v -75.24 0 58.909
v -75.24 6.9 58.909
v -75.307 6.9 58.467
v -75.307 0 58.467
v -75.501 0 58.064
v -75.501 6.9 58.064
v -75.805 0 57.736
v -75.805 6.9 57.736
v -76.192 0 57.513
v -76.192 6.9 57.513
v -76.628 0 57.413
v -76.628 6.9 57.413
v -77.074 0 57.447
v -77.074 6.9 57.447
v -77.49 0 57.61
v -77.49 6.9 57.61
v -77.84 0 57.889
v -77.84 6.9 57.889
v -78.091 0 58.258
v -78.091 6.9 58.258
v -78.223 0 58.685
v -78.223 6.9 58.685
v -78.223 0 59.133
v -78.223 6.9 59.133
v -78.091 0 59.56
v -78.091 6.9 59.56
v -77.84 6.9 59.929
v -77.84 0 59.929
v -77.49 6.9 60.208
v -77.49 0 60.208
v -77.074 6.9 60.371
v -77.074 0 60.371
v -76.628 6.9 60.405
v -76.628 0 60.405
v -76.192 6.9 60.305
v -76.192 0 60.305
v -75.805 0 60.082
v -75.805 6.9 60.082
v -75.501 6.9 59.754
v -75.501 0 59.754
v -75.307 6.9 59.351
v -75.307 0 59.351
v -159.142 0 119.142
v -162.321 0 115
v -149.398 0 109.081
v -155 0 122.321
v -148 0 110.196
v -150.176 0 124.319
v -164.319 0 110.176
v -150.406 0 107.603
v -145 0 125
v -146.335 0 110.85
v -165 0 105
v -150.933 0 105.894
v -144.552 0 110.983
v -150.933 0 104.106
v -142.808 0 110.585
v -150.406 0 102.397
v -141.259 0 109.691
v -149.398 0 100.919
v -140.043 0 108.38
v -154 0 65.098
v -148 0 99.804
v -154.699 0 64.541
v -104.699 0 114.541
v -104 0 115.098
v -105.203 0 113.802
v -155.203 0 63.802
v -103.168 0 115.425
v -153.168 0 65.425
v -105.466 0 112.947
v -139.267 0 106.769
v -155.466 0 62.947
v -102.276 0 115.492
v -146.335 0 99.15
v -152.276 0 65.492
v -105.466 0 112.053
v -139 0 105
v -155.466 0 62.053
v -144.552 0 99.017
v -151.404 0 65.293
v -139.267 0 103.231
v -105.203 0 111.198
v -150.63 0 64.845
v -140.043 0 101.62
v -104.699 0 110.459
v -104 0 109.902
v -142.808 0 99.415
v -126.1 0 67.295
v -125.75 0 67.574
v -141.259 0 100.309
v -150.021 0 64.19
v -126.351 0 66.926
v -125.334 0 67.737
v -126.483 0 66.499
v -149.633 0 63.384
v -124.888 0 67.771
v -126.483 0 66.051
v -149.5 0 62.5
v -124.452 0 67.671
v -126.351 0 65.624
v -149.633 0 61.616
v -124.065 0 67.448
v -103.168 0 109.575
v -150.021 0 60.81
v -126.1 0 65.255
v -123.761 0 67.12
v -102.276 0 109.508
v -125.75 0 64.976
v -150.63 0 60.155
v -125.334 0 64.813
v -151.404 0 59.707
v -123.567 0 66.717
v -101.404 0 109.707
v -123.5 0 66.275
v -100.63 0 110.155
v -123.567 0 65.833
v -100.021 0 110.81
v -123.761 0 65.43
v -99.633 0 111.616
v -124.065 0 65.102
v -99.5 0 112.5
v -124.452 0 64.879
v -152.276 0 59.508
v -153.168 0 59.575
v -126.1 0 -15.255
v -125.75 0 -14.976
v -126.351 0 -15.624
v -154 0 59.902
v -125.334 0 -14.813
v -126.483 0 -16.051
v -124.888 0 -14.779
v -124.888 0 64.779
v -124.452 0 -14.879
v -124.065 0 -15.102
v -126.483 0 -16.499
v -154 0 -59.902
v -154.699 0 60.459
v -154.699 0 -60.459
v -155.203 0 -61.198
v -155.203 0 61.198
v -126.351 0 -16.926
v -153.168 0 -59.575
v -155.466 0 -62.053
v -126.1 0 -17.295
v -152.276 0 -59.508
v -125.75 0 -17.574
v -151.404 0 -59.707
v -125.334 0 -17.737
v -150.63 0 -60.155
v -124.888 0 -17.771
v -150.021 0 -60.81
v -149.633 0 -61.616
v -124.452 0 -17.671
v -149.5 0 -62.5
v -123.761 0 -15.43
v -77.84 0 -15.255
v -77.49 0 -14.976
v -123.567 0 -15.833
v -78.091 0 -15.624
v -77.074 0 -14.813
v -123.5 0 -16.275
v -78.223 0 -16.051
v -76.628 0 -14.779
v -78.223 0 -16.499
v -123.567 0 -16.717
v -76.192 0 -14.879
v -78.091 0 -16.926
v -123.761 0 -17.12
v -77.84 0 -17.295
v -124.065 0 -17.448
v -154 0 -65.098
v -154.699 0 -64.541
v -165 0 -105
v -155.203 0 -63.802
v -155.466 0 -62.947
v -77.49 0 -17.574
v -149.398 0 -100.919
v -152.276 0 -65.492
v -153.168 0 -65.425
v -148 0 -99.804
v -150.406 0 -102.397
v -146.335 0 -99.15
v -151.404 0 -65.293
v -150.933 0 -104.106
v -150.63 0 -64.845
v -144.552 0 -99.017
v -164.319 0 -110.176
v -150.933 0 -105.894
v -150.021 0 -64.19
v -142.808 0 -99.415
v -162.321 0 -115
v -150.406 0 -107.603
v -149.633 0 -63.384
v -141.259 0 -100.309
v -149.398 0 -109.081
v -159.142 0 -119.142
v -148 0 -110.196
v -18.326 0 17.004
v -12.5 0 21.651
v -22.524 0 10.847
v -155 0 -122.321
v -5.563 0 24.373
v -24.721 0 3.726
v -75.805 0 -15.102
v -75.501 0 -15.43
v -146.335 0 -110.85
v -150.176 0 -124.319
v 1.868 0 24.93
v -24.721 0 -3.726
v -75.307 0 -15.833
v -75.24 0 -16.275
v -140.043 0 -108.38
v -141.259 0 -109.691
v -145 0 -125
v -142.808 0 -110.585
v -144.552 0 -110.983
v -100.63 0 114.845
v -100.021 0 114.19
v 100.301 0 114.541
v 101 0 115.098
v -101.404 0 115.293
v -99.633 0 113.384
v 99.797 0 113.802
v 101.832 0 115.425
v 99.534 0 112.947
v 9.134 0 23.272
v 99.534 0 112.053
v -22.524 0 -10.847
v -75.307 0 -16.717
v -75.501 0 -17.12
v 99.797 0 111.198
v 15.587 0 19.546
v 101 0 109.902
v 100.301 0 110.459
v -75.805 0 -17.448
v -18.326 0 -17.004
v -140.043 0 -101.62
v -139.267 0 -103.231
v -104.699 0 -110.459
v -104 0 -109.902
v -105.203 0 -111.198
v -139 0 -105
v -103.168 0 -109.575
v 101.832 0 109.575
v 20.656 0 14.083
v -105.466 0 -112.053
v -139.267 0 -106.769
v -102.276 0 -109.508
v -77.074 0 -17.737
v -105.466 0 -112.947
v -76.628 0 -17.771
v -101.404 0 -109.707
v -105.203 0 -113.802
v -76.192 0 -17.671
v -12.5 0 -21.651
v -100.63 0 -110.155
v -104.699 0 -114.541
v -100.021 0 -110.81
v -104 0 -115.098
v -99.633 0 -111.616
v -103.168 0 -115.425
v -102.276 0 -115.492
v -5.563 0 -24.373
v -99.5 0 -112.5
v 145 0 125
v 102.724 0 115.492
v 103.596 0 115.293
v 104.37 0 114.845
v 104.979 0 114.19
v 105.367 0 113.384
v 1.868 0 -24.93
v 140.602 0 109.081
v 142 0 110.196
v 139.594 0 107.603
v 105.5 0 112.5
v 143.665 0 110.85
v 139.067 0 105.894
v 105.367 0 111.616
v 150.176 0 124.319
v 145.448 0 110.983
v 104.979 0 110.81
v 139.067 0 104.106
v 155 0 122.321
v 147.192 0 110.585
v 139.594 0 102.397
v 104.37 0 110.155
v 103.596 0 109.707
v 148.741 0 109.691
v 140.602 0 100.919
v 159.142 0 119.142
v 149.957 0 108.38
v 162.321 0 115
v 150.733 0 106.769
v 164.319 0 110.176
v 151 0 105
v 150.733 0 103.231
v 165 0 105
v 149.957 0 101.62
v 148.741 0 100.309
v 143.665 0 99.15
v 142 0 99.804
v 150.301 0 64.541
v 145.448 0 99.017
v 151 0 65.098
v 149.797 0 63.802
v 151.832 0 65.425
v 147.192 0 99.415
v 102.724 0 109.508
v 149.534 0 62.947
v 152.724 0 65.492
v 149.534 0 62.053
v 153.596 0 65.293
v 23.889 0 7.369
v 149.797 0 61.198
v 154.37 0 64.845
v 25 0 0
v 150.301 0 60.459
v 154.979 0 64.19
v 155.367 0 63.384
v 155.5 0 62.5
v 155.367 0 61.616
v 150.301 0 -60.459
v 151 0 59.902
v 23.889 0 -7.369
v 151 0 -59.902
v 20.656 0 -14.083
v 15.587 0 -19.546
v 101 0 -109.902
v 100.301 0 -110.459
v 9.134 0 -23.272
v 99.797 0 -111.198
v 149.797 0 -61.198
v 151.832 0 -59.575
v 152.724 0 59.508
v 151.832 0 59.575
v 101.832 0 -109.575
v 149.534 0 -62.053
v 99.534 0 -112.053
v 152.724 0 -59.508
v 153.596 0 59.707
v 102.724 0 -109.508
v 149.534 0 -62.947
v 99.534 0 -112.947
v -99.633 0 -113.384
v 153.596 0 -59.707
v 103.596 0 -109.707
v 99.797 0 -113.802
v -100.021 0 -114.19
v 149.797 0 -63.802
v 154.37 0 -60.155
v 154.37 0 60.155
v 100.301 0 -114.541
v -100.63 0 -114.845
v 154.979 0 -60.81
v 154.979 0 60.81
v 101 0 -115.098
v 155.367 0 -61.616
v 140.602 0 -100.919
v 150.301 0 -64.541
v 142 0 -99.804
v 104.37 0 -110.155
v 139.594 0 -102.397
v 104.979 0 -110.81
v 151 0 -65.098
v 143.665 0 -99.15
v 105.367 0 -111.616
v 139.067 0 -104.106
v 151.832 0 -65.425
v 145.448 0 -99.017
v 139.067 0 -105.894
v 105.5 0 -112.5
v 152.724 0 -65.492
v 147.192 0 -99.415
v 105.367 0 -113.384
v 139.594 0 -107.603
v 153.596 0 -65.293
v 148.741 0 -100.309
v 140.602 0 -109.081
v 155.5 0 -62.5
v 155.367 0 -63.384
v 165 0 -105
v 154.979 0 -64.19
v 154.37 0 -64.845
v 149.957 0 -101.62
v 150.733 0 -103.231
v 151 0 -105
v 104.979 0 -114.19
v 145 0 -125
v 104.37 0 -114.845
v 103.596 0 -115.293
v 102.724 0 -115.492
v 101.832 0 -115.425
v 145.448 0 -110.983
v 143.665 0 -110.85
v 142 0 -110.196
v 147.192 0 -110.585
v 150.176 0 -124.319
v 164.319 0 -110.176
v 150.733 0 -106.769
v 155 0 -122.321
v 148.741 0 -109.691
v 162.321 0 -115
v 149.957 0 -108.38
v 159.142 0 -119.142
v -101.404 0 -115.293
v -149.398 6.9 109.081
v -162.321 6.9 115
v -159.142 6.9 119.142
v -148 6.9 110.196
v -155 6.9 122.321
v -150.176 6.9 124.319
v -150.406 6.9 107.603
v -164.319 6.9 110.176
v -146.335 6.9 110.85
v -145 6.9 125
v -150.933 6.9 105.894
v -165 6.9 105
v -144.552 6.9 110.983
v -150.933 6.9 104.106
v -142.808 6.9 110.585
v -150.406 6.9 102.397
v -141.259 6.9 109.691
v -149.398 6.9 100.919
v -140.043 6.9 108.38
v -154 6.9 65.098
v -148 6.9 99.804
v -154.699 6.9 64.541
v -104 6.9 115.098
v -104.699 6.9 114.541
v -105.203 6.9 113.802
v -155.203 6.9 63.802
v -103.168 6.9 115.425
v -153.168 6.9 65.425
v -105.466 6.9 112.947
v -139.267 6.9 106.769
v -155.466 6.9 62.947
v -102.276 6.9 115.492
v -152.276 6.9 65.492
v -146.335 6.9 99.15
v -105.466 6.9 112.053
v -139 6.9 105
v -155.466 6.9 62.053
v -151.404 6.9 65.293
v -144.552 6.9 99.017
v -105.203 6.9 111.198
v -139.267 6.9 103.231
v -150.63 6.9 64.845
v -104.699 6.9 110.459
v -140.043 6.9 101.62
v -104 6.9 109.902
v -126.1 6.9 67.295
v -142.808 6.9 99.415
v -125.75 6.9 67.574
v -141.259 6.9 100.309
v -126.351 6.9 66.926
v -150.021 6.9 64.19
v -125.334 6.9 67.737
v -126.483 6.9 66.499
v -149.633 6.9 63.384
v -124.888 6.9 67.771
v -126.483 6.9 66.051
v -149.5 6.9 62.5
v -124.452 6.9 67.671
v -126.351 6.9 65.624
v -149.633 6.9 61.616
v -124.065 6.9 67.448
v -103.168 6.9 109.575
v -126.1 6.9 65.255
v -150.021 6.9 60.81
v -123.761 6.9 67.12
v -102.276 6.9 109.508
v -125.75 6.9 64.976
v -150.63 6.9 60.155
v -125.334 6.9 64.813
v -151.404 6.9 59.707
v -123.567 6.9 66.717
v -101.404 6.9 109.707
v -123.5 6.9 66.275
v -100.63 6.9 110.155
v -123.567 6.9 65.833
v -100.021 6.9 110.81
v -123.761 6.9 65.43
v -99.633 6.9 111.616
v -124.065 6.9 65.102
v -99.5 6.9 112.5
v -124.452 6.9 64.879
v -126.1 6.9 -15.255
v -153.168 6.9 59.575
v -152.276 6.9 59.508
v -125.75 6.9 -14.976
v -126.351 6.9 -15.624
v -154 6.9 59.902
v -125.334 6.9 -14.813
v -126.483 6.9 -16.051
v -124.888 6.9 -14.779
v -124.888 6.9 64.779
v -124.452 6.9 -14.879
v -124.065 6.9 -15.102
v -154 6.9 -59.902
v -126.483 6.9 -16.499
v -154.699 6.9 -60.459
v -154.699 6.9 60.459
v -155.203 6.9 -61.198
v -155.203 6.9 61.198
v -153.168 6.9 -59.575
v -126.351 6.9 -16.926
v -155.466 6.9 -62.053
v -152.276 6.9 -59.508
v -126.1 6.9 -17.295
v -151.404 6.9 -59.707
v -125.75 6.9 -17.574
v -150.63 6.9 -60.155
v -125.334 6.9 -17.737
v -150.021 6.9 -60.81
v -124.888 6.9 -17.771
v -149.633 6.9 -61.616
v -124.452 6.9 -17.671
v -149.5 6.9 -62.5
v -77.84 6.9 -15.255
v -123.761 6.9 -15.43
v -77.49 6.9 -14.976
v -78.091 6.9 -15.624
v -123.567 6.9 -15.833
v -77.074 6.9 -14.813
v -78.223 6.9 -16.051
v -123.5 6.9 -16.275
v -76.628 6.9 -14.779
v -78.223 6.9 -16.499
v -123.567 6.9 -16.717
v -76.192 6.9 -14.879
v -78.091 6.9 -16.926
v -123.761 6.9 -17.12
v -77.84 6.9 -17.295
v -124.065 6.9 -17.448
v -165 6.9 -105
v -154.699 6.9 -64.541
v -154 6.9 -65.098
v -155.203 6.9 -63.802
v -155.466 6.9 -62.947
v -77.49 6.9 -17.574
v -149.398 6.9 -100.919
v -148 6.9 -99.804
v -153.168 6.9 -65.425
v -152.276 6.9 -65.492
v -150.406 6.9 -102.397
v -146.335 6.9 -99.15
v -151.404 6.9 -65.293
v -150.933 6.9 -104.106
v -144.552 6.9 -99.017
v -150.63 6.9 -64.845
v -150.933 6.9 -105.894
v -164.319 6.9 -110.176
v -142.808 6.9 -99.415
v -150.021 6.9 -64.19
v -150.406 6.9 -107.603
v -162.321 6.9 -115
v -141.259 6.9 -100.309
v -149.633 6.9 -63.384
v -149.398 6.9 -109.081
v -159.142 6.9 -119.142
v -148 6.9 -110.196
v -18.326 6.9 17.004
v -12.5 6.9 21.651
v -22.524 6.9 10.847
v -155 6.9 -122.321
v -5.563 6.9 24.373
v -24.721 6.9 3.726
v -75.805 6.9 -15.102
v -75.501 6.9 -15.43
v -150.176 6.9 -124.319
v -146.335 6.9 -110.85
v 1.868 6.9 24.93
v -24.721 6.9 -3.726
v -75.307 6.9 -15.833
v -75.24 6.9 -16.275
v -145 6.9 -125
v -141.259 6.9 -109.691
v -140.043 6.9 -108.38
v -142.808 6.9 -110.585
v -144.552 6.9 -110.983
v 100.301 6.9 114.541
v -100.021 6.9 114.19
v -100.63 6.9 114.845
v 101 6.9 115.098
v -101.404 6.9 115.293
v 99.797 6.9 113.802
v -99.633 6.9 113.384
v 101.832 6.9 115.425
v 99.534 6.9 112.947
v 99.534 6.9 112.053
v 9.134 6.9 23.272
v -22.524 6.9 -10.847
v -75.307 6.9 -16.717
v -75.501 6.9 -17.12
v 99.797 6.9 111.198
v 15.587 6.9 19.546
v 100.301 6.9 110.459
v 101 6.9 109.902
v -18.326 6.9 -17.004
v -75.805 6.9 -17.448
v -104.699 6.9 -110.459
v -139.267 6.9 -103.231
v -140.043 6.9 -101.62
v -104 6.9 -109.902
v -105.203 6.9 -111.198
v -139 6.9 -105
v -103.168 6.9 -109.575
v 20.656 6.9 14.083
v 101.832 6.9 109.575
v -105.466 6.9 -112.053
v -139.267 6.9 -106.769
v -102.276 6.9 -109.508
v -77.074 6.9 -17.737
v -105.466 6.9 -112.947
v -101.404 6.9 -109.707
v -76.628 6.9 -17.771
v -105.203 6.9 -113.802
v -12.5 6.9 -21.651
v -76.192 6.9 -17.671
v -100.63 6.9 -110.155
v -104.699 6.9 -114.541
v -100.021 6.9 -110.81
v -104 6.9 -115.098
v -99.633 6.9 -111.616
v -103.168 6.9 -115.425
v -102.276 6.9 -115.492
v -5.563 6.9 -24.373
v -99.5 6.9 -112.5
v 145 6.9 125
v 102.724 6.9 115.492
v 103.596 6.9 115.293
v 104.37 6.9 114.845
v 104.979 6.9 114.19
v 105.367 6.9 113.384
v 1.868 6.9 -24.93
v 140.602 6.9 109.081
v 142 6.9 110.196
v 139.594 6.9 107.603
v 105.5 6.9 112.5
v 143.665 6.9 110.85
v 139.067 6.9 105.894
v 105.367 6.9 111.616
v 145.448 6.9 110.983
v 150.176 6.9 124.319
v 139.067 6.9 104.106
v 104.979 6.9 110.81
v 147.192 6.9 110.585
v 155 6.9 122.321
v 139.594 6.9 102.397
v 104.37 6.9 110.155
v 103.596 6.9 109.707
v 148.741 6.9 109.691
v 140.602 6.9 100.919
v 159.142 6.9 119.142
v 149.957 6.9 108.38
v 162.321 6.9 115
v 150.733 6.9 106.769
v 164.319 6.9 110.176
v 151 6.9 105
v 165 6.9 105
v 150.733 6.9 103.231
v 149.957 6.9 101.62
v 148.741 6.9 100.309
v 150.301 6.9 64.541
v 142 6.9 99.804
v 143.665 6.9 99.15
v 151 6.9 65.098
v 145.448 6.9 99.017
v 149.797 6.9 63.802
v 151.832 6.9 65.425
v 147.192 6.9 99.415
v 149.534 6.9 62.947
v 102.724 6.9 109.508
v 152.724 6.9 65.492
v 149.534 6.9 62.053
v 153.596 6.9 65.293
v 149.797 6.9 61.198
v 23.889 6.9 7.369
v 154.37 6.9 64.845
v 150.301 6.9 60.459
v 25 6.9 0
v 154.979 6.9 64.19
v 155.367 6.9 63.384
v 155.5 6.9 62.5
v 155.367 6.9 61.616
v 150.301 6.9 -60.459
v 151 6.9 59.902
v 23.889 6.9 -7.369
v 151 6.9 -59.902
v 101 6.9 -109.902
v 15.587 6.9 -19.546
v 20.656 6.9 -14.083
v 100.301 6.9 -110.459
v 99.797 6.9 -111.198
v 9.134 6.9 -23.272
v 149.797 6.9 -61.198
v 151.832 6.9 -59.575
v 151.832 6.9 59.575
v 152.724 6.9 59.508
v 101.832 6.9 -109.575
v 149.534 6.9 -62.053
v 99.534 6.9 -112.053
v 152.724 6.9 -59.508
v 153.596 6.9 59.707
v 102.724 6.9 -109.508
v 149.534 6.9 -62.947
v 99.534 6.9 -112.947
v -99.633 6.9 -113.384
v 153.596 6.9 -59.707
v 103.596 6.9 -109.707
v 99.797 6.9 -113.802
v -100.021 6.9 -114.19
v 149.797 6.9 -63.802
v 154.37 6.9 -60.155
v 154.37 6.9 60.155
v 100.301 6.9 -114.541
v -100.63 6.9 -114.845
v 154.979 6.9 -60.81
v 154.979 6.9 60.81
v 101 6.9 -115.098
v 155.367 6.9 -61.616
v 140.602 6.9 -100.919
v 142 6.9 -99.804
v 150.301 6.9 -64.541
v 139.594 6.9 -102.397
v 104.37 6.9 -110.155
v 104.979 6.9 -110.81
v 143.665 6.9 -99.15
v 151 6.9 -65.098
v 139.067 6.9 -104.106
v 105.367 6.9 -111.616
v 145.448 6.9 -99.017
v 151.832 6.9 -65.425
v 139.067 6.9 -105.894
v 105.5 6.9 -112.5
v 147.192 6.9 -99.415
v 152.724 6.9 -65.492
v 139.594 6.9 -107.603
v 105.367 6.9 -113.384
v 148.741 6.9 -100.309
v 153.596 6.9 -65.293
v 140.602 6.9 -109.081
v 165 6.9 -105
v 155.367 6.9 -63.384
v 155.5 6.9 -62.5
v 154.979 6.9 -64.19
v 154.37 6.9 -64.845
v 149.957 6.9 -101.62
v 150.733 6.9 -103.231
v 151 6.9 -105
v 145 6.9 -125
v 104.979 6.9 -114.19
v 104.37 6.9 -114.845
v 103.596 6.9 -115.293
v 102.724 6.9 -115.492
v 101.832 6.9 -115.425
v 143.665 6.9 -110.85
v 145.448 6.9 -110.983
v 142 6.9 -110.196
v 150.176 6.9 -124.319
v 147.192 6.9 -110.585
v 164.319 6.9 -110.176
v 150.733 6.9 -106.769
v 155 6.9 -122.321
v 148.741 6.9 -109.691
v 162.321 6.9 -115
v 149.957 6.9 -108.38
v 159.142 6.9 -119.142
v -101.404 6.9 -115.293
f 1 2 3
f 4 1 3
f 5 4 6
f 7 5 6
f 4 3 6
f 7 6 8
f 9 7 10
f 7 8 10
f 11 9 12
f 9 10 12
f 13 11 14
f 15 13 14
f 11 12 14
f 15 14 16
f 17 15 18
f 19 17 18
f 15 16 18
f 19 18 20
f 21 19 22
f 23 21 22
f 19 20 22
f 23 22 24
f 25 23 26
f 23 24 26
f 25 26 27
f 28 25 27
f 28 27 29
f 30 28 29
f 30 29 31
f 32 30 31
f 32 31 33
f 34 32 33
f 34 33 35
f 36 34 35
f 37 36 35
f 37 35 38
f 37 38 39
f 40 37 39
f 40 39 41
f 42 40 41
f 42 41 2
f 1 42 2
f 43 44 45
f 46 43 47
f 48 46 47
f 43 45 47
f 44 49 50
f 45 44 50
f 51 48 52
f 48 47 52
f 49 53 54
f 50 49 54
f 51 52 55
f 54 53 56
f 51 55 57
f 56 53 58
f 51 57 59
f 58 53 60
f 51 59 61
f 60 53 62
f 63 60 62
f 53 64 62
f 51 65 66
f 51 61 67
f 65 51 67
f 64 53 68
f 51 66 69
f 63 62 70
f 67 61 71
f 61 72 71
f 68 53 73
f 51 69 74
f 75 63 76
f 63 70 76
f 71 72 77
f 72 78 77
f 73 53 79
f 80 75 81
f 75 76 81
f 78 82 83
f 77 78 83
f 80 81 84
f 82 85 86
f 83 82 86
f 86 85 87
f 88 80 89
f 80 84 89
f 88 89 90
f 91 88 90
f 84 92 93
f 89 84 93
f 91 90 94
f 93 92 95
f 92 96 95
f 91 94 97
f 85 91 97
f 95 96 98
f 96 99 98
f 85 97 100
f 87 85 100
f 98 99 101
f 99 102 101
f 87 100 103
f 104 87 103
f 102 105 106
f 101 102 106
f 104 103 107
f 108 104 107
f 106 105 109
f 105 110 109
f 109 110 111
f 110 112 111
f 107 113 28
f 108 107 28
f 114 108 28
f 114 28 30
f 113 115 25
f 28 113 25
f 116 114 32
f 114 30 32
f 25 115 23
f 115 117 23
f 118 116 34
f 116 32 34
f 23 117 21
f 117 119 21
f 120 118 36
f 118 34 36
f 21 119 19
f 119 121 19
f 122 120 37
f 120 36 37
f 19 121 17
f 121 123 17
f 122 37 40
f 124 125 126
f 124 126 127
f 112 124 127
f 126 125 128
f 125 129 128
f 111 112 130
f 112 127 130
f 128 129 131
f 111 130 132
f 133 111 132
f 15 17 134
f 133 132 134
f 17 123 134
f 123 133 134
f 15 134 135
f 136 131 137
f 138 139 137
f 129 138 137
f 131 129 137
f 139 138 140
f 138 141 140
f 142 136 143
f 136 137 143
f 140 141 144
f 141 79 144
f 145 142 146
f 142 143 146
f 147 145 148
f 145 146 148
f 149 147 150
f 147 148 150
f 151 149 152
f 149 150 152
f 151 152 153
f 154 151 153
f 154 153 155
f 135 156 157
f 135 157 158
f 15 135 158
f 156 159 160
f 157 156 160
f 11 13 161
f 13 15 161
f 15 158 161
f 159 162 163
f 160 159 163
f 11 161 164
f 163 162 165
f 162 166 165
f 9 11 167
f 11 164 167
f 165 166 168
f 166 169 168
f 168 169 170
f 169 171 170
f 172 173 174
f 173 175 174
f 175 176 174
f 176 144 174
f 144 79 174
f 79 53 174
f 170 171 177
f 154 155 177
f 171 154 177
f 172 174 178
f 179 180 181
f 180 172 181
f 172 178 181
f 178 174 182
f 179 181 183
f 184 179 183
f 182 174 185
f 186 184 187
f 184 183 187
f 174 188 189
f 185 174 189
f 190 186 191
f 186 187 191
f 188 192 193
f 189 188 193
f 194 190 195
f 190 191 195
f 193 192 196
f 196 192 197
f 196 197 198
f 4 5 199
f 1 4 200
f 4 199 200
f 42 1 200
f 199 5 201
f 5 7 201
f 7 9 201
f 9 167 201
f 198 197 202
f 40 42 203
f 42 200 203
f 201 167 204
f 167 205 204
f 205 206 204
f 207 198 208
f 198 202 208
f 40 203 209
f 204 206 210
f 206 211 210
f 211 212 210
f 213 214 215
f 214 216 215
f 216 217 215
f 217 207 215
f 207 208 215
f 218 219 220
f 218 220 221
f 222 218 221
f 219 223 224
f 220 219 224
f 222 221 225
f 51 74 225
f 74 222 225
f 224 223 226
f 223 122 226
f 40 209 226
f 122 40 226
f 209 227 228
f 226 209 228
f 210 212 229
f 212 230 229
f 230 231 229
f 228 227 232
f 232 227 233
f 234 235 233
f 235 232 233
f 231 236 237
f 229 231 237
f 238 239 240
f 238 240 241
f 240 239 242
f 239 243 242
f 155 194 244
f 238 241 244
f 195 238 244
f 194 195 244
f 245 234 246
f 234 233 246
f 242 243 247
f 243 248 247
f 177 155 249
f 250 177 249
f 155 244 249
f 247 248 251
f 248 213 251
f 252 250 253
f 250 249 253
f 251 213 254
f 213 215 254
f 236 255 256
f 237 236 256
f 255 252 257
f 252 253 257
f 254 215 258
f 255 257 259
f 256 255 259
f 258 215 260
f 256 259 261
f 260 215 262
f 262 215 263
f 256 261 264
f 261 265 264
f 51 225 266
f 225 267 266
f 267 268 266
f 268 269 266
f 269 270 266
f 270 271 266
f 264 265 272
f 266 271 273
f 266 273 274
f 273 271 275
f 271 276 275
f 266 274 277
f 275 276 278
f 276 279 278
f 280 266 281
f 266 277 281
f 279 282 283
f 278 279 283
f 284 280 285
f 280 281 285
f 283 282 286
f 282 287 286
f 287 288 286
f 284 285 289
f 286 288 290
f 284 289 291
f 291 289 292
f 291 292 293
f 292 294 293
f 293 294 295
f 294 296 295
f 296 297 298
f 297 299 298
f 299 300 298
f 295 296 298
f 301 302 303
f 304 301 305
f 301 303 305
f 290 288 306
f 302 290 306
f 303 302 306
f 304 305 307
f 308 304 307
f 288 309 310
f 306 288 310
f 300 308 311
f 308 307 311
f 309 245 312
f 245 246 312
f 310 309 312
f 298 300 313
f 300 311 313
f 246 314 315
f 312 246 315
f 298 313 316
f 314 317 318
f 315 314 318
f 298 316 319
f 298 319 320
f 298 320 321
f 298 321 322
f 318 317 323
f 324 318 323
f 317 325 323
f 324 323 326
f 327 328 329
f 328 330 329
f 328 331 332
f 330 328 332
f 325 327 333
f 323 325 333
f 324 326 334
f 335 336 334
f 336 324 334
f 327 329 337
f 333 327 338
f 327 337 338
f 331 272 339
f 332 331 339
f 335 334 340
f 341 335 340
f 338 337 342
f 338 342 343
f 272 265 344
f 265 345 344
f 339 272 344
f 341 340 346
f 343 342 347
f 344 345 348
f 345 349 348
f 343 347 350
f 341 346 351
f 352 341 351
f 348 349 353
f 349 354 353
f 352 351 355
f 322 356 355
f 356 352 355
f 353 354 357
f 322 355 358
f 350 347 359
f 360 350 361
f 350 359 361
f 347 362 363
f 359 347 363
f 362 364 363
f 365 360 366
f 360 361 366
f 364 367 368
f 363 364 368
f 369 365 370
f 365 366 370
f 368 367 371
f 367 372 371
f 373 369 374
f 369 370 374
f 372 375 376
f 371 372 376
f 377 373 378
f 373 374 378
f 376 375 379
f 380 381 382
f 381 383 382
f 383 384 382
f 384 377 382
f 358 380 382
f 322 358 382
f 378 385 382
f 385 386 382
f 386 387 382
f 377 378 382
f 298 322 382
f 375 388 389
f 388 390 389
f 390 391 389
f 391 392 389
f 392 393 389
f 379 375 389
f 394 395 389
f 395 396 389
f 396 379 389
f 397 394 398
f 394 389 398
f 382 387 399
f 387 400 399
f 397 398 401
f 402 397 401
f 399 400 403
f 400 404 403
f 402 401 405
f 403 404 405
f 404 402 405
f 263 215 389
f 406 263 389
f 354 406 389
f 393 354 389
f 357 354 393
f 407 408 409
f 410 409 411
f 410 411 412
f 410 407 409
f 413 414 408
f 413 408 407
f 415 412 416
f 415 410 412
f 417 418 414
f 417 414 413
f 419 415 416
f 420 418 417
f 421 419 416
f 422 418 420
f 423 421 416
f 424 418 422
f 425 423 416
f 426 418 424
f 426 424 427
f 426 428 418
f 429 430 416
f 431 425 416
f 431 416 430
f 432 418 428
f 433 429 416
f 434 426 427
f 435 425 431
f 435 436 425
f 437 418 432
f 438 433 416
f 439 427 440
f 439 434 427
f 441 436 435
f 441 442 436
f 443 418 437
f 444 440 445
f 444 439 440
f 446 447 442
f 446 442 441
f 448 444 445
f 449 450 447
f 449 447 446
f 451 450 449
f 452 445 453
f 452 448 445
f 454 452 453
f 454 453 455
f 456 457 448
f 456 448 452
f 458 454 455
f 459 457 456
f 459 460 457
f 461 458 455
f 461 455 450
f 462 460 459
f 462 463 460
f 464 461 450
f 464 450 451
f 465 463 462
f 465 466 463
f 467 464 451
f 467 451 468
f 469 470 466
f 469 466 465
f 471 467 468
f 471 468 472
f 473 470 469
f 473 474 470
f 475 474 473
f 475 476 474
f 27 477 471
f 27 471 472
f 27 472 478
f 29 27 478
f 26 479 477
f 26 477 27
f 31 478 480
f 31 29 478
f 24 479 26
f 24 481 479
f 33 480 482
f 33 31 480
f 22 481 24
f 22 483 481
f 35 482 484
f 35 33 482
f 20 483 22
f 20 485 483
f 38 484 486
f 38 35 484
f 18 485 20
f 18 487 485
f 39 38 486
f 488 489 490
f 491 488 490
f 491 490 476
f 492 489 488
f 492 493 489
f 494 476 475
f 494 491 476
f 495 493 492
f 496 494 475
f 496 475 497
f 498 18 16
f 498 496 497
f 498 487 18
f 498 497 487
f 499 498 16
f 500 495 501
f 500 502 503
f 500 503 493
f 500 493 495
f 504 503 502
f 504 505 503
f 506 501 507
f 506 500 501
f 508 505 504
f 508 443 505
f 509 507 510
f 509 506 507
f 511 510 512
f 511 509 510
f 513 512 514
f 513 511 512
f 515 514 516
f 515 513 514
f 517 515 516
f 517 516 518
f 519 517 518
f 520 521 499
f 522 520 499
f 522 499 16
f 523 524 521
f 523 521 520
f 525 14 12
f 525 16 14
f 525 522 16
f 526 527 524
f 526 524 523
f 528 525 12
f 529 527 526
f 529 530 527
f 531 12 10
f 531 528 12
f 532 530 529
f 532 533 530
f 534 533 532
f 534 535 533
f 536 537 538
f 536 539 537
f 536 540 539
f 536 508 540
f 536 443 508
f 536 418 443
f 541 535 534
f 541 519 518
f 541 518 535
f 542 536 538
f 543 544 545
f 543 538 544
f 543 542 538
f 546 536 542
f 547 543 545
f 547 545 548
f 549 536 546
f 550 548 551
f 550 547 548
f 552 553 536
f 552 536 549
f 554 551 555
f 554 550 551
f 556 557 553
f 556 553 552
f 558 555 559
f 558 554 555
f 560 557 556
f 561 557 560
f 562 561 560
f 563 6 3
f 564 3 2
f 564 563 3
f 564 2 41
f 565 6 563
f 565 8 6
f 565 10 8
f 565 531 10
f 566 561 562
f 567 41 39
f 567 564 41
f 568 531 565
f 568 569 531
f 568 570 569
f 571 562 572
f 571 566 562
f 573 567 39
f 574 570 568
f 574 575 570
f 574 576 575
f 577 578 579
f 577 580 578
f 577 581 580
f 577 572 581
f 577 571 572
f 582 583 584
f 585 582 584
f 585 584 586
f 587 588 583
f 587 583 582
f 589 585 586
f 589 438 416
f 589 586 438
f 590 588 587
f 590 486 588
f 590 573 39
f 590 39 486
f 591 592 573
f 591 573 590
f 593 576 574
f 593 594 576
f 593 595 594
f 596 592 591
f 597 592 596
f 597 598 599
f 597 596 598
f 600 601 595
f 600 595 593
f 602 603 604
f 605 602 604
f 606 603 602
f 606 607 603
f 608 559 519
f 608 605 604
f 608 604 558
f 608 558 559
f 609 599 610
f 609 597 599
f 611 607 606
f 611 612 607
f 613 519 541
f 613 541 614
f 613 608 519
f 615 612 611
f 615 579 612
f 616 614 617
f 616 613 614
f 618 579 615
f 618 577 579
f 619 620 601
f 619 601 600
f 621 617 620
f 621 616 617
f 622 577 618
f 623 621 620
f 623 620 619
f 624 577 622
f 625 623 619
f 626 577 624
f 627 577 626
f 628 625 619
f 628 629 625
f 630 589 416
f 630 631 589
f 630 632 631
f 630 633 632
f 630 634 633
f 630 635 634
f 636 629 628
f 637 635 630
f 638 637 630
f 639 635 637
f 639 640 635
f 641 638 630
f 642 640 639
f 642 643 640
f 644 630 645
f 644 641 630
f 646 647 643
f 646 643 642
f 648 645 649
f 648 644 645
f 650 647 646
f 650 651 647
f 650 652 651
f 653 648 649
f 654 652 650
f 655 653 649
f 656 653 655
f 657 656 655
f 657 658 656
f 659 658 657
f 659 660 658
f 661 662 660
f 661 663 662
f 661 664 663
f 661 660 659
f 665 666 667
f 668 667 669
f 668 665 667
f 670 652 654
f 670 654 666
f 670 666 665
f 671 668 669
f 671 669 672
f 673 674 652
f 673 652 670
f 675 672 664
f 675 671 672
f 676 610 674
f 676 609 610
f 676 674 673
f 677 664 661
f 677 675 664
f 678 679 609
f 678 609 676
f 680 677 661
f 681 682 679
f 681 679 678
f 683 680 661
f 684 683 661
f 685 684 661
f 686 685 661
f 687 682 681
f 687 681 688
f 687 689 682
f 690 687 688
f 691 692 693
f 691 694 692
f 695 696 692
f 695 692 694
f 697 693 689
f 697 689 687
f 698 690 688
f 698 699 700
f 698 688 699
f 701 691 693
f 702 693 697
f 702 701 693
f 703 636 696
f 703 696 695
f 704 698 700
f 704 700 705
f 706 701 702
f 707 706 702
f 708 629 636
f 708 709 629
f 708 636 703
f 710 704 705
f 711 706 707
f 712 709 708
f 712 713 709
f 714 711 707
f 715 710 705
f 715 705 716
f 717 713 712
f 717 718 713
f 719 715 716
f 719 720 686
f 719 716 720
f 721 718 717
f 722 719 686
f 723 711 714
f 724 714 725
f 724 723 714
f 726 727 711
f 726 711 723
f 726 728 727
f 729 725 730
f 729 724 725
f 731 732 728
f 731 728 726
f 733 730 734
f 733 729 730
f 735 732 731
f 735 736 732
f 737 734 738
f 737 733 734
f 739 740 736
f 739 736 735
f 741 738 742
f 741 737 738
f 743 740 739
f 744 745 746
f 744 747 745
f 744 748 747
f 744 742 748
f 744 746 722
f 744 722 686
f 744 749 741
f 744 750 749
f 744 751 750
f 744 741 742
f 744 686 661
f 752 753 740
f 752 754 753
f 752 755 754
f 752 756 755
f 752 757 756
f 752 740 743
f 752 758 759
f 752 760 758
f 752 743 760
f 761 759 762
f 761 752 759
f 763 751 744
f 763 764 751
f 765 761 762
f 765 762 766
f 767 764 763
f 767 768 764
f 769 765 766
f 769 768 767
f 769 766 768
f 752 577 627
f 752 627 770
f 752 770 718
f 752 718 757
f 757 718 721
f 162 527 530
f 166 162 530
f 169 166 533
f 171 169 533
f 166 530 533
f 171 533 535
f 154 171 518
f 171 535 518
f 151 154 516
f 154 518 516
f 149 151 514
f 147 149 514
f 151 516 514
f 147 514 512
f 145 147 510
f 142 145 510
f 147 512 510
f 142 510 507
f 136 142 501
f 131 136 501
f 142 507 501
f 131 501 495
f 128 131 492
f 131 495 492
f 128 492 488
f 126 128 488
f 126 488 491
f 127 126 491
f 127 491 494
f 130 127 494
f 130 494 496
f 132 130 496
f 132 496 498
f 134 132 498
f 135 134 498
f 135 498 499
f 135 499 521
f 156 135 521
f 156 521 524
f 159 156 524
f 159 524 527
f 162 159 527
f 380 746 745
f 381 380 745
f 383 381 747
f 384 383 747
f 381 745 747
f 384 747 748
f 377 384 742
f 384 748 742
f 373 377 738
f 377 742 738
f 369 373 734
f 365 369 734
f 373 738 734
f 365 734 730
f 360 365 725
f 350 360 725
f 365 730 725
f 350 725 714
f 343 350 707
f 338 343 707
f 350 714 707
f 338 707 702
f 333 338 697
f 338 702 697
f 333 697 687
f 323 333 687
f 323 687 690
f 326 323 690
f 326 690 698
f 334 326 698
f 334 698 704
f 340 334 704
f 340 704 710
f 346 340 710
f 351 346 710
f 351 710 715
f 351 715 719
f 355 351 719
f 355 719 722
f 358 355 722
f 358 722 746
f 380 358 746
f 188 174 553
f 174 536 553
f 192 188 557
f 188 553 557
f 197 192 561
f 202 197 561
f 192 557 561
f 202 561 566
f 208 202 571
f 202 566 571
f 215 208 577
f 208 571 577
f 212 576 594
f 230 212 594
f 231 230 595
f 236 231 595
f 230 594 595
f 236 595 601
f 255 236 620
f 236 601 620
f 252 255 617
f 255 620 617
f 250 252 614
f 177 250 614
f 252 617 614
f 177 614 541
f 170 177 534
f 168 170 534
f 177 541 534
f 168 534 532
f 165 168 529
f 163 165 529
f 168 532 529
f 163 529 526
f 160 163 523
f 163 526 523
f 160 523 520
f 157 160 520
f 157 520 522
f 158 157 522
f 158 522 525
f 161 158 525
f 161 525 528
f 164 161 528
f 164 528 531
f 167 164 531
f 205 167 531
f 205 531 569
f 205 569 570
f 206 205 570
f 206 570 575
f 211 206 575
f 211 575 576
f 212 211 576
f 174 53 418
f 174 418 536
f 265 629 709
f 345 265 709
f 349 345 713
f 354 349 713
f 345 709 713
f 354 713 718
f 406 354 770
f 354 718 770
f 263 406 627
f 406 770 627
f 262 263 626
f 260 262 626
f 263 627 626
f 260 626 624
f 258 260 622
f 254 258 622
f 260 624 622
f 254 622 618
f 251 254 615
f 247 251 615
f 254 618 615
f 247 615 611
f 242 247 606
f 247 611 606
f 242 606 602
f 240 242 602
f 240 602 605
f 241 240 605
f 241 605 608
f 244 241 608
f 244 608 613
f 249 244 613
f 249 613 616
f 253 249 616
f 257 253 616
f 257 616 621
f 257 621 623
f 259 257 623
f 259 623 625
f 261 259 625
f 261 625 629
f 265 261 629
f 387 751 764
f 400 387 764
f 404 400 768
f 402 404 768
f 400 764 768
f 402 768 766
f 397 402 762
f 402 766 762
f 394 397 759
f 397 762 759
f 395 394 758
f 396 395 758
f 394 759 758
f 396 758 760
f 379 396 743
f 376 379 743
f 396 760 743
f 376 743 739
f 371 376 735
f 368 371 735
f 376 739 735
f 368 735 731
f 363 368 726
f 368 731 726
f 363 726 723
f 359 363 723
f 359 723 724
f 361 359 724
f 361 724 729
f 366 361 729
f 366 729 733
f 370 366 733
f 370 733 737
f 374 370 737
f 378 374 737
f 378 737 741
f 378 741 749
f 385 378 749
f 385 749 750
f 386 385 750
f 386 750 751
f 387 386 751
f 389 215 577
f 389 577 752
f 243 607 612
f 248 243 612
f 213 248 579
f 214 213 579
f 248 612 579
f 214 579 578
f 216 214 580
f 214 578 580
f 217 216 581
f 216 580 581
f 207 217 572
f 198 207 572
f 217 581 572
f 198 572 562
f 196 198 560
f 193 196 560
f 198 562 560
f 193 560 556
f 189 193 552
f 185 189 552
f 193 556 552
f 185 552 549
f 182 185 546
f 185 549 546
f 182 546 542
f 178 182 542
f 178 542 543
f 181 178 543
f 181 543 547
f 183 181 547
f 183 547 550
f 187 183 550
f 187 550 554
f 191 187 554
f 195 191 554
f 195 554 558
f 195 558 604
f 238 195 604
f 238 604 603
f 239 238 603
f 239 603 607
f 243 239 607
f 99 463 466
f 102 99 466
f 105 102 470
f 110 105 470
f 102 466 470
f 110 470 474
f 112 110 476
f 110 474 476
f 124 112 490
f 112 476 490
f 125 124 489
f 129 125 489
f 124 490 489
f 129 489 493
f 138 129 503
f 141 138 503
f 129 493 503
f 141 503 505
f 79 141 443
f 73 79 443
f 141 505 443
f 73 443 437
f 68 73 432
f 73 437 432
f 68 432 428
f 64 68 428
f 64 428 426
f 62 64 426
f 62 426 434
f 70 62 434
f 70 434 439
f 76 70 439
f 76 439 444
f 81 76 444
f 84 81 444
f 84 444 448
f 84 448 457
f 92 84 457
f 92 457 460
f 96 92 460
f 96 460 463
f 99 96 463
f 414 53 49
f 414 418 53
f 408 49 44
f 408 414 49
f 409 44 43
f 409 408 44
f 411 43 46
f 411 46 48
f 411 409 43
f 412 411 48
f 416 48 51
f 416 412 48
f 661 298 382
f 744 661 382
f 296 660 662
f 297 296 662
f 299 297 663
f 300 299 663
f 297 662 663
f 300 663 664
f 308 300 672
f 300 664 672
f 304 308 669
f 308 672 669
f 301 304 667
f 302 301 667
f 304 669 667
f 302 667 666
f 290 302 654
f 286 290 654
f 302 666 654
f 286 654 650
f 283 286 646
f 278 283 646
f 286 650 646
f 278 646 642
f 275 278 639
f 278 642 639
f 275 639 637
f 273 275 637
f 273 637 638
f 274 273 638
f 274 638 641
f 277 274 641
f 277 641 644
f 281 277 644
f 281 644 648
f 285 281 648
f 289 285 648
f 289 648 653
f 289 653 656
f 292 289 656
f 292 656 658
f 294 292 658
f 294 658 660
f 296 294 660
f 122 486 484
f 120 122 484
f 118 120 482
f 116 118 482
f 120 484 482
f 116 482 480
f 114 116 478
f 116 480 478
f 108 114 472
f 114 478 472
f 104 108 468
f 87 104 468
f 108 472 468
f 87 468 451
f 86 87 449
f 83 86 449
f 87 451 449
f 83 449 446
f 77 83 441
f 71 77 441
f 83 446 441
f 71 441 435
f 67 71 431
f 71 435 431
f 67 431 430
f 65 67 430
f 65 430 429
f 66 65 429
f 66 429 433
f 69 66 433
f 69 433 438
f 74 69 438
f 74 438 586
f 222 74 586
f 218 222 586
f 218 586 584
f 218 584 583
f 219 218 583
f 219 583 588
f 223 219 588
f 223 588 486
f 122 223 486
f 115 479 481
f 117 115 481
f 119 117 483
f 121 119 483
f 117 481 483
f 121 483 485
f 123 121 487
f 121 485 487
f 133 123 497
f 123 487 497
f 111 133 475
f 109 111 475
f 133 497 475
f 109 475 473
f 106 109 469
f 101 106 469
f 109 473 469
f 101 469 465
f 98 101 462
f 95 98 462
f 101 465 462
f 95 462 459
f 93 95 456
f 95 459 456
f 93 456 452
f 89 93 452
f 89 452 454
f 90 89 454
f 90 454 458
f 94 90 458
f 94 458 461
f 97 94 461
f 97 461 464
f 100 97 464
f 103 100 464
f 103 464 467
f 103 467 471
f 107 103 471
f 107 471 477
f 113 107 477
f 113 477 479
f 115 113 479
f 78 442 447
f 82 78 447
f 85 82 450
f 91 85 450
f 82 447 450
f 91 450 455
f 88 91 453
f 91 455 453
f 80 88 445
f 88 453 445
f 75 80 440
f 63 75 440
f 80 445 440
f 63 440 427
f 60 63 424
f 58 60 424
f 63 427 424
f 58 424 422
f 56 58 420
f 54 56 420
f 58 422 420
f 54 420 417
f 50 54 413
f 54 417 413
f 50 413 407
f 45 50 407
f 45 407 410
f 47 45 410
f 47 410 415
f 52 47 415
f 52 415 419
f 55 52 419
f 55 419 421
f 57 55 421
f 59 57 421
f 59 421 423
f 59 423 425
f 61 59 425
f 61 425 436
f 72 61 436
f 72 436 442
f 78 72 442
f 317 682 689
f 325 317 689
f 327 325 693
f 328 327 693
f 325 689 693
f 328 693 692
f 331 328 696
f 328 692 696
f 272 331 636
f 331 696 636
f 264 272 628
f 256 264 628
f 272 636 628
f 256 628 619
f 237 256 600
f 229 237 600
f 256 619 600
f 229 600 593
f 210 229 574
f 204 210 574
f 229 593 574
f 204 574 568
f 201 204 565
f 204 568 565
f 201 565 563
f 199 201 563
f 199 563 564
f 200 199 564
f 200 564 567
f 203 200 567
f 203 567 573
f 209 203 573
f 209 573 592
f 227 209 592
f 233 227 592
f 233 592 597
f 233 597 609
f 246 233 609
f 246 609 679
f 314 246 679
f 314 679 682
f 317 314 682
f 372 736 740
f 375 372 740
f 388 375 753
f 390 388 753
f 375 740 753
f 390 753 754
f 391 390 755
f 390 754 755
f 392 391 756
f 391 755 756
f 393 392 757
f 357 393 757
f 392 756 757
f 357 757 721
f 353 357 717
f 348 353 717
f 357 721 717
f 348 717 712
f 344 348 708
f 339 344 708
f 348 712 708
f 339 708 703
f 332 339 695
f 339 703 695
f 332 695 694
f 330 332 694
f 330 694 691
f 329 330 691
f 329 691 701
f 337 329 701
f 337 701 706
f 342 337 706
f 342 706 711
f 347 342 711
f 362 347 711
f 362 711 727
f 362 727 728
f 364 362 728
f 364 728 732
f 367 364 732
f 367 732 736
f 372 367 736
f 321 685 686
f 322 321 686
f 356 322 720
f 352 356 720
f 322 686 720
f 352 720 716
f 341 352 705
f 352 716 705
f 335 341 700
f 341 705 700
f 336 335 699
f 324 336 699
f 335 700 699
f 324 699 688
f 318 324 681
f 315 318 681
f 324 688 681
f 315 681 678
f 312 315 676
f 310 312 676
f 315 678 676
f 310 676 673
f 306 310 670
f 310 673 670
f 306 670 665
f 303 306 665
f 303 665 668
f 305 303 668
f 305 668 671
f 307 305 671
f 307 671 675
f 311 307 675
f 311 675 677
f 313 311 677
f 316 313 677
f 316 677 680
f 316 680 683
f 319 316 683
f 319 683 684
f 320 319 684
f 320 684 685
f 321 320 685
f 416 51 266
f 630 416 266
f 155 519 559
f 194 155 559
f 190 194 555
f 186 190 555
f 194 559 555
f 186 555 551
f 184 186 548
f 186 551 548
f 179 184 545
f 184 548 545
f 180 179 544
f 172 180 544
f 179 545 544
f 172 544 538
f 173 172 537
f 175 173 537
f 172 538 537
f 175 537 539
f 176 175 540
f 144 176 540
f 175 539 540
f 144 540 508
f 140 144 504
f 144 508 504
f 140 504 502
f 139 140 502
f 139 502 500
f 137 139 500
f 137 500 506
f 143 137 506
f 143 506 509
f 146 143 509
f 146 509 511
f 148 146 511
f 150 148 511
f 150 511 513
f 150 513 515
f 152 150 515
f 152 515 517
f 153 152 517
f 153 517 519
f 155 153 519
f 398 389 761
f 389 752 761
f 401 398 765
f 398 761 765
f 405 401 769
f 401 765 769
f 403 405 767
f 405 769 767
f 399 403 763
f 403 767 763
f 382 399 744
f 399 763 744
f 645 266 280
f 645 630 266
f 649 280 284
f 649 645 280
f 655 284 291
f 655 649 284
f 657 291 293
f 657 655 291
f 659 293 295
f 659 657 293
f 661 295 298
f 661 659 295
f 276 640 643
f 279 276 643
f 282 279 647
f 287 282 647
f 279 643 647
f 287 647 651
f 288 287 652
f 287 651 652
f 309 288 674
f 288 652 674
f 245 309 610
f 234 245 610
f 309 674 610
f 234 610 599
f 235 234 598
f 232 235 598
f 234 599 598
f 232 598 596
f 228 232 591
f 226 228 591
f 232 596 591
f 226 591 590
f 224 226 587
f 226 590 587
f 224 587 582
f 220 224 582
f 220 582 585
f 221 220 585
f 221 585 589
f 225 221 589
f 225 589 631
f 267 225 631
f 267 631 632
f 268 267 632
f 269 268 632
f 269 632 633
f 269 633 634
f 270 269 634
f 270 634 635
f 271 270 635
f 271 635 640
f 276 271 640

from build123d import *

# Parameters (mm, degrees)
SKETCH1_W           = 330
SKETCH1_H           = 250
BOSS_EXTRUDE1_DEPTH = 6.9
SKETCH2_R           = 6
CUT_EXTRUDE1_DEPTH  = 7.9
SKETCH3_R           = 25
CUT_EXTRUDE2_DEPTH  = 7.9
SKETCH4_R           = 3
CUT_EXTRUDE3_DEPTH  = 7.9
FILLET1_R           = 20
SKETCH5_R           = 1.5
CUT_EXTRUDE4_DEPTH  = 7.9


with BuildPart() as part:
    # Sketch1 → Boss-Extrude1 (new body)
    with BuildSketch(Plane(origin=(0, 0, 0), x_dir=(1, 0, 0), z_dir=(0, 1, 0))):
        Rectangle(SKETCH1_W, SKETCH1_H)
    extrude(amount=BOSS_EXTRUDE1_DEPTH)

    # Sketch2 → Cut-Extrude1 (cut, through all)
    with BuildSketch(Plane(origin=(0, 6.9, 0), x_dir=(1, 0, 0), z_dir=(0, 1, 0))):
        with Locations((-145, 105)):
            Circle(SKETCH2_R)
        with Locations((145, 105)):
            Circle(SKETCH2_R)
        with Locations((145, -105)):
            Circle(SKETCH2_R)
        with Locations((-145, -105)):
            Circle(SKETCH2_R)
    extrude(amount=-CUT_EXTRUDE1_DEPTH, mode=Mode.SUBTRACT)

    # Sketch3 → Cut-Extrude2 (cut, through all)
    with BuildSketch(Plane(origin=(0, 6.9, 0), x_dir=(1, 0, 0), z_dir=(0, 1, 0))):
        Circle(SKETCH3_R)
    extrude(amount=-CUT_EXTRUDE2_DEPTH, mode=Mode.SUBTRACT)

    # Sketch4 → Cut-Extrude3 (cut, through all)
    with BuildSketch(Plane(origin=(0, 6.9, 0), x_dir=(1, 0, 0), z_dir=(0, 1, 0))):
        with Locations((-152.5, -62.5)):
            Circle(SKETCH4_R)
        with Locations((-102.5, -112.5)):
            Circle(SKETCH4_R)
        with Locations((-102.5, 112.5)):
            Circle(SKETCH4_R)
        with Locations((-152.5, 62.5)):
            Circle(SKETCH4_R)
        with Locations((152.5, 62.5)):
            Circle(SKETCH4_R)
        with Locations((102.5, 112.5)):
            Circle(SKETCH4_R)
        with Locations((102.5, -112.5)):
            Circle(SKETCH4_R)
        with Locations((152.5, -62.5)):
            Circle(SKETCH4_R)
    extrude(amount=-CUT_EXTRUDE3_DEPTH, mode=Mode.SUBTRACT)

    # Fillet1
    fillet1_edges = [part.edges().sort_by_distance(p)[0] for p in [
        (-165, 3.45, -125),
        (165, 3.45, -125),
        (165, 3.45, 125),
        (-165, 3.45, 125),
    ]]
    fillet(fillet1_edges, radius=FILLET1_R)

    # Sketch5 → Cut-Extrude4 (cut, through all)
    with BuildSketch(Plane(origin=(0, 6.9, 0), x_dir=(1, 0, 0), z_dir=(0, 1, 0))):
        with Locations((-125, 16.275)):
            Circle(SKETCH5_R)
        with Locations((-76.74, 16.275)):
            Circle(SKETCH5_R)
        with Locations((-125, -66.275)):
            Circle(SKETCH5_R)
        with Locations((-76.74, -58.909)):
            Circle(SKETCH5_R)
    extrude(amount=-CUT_EXTRUDE4_DEPTH, mode=Mode.SUBTRACT)


solid = part.part
